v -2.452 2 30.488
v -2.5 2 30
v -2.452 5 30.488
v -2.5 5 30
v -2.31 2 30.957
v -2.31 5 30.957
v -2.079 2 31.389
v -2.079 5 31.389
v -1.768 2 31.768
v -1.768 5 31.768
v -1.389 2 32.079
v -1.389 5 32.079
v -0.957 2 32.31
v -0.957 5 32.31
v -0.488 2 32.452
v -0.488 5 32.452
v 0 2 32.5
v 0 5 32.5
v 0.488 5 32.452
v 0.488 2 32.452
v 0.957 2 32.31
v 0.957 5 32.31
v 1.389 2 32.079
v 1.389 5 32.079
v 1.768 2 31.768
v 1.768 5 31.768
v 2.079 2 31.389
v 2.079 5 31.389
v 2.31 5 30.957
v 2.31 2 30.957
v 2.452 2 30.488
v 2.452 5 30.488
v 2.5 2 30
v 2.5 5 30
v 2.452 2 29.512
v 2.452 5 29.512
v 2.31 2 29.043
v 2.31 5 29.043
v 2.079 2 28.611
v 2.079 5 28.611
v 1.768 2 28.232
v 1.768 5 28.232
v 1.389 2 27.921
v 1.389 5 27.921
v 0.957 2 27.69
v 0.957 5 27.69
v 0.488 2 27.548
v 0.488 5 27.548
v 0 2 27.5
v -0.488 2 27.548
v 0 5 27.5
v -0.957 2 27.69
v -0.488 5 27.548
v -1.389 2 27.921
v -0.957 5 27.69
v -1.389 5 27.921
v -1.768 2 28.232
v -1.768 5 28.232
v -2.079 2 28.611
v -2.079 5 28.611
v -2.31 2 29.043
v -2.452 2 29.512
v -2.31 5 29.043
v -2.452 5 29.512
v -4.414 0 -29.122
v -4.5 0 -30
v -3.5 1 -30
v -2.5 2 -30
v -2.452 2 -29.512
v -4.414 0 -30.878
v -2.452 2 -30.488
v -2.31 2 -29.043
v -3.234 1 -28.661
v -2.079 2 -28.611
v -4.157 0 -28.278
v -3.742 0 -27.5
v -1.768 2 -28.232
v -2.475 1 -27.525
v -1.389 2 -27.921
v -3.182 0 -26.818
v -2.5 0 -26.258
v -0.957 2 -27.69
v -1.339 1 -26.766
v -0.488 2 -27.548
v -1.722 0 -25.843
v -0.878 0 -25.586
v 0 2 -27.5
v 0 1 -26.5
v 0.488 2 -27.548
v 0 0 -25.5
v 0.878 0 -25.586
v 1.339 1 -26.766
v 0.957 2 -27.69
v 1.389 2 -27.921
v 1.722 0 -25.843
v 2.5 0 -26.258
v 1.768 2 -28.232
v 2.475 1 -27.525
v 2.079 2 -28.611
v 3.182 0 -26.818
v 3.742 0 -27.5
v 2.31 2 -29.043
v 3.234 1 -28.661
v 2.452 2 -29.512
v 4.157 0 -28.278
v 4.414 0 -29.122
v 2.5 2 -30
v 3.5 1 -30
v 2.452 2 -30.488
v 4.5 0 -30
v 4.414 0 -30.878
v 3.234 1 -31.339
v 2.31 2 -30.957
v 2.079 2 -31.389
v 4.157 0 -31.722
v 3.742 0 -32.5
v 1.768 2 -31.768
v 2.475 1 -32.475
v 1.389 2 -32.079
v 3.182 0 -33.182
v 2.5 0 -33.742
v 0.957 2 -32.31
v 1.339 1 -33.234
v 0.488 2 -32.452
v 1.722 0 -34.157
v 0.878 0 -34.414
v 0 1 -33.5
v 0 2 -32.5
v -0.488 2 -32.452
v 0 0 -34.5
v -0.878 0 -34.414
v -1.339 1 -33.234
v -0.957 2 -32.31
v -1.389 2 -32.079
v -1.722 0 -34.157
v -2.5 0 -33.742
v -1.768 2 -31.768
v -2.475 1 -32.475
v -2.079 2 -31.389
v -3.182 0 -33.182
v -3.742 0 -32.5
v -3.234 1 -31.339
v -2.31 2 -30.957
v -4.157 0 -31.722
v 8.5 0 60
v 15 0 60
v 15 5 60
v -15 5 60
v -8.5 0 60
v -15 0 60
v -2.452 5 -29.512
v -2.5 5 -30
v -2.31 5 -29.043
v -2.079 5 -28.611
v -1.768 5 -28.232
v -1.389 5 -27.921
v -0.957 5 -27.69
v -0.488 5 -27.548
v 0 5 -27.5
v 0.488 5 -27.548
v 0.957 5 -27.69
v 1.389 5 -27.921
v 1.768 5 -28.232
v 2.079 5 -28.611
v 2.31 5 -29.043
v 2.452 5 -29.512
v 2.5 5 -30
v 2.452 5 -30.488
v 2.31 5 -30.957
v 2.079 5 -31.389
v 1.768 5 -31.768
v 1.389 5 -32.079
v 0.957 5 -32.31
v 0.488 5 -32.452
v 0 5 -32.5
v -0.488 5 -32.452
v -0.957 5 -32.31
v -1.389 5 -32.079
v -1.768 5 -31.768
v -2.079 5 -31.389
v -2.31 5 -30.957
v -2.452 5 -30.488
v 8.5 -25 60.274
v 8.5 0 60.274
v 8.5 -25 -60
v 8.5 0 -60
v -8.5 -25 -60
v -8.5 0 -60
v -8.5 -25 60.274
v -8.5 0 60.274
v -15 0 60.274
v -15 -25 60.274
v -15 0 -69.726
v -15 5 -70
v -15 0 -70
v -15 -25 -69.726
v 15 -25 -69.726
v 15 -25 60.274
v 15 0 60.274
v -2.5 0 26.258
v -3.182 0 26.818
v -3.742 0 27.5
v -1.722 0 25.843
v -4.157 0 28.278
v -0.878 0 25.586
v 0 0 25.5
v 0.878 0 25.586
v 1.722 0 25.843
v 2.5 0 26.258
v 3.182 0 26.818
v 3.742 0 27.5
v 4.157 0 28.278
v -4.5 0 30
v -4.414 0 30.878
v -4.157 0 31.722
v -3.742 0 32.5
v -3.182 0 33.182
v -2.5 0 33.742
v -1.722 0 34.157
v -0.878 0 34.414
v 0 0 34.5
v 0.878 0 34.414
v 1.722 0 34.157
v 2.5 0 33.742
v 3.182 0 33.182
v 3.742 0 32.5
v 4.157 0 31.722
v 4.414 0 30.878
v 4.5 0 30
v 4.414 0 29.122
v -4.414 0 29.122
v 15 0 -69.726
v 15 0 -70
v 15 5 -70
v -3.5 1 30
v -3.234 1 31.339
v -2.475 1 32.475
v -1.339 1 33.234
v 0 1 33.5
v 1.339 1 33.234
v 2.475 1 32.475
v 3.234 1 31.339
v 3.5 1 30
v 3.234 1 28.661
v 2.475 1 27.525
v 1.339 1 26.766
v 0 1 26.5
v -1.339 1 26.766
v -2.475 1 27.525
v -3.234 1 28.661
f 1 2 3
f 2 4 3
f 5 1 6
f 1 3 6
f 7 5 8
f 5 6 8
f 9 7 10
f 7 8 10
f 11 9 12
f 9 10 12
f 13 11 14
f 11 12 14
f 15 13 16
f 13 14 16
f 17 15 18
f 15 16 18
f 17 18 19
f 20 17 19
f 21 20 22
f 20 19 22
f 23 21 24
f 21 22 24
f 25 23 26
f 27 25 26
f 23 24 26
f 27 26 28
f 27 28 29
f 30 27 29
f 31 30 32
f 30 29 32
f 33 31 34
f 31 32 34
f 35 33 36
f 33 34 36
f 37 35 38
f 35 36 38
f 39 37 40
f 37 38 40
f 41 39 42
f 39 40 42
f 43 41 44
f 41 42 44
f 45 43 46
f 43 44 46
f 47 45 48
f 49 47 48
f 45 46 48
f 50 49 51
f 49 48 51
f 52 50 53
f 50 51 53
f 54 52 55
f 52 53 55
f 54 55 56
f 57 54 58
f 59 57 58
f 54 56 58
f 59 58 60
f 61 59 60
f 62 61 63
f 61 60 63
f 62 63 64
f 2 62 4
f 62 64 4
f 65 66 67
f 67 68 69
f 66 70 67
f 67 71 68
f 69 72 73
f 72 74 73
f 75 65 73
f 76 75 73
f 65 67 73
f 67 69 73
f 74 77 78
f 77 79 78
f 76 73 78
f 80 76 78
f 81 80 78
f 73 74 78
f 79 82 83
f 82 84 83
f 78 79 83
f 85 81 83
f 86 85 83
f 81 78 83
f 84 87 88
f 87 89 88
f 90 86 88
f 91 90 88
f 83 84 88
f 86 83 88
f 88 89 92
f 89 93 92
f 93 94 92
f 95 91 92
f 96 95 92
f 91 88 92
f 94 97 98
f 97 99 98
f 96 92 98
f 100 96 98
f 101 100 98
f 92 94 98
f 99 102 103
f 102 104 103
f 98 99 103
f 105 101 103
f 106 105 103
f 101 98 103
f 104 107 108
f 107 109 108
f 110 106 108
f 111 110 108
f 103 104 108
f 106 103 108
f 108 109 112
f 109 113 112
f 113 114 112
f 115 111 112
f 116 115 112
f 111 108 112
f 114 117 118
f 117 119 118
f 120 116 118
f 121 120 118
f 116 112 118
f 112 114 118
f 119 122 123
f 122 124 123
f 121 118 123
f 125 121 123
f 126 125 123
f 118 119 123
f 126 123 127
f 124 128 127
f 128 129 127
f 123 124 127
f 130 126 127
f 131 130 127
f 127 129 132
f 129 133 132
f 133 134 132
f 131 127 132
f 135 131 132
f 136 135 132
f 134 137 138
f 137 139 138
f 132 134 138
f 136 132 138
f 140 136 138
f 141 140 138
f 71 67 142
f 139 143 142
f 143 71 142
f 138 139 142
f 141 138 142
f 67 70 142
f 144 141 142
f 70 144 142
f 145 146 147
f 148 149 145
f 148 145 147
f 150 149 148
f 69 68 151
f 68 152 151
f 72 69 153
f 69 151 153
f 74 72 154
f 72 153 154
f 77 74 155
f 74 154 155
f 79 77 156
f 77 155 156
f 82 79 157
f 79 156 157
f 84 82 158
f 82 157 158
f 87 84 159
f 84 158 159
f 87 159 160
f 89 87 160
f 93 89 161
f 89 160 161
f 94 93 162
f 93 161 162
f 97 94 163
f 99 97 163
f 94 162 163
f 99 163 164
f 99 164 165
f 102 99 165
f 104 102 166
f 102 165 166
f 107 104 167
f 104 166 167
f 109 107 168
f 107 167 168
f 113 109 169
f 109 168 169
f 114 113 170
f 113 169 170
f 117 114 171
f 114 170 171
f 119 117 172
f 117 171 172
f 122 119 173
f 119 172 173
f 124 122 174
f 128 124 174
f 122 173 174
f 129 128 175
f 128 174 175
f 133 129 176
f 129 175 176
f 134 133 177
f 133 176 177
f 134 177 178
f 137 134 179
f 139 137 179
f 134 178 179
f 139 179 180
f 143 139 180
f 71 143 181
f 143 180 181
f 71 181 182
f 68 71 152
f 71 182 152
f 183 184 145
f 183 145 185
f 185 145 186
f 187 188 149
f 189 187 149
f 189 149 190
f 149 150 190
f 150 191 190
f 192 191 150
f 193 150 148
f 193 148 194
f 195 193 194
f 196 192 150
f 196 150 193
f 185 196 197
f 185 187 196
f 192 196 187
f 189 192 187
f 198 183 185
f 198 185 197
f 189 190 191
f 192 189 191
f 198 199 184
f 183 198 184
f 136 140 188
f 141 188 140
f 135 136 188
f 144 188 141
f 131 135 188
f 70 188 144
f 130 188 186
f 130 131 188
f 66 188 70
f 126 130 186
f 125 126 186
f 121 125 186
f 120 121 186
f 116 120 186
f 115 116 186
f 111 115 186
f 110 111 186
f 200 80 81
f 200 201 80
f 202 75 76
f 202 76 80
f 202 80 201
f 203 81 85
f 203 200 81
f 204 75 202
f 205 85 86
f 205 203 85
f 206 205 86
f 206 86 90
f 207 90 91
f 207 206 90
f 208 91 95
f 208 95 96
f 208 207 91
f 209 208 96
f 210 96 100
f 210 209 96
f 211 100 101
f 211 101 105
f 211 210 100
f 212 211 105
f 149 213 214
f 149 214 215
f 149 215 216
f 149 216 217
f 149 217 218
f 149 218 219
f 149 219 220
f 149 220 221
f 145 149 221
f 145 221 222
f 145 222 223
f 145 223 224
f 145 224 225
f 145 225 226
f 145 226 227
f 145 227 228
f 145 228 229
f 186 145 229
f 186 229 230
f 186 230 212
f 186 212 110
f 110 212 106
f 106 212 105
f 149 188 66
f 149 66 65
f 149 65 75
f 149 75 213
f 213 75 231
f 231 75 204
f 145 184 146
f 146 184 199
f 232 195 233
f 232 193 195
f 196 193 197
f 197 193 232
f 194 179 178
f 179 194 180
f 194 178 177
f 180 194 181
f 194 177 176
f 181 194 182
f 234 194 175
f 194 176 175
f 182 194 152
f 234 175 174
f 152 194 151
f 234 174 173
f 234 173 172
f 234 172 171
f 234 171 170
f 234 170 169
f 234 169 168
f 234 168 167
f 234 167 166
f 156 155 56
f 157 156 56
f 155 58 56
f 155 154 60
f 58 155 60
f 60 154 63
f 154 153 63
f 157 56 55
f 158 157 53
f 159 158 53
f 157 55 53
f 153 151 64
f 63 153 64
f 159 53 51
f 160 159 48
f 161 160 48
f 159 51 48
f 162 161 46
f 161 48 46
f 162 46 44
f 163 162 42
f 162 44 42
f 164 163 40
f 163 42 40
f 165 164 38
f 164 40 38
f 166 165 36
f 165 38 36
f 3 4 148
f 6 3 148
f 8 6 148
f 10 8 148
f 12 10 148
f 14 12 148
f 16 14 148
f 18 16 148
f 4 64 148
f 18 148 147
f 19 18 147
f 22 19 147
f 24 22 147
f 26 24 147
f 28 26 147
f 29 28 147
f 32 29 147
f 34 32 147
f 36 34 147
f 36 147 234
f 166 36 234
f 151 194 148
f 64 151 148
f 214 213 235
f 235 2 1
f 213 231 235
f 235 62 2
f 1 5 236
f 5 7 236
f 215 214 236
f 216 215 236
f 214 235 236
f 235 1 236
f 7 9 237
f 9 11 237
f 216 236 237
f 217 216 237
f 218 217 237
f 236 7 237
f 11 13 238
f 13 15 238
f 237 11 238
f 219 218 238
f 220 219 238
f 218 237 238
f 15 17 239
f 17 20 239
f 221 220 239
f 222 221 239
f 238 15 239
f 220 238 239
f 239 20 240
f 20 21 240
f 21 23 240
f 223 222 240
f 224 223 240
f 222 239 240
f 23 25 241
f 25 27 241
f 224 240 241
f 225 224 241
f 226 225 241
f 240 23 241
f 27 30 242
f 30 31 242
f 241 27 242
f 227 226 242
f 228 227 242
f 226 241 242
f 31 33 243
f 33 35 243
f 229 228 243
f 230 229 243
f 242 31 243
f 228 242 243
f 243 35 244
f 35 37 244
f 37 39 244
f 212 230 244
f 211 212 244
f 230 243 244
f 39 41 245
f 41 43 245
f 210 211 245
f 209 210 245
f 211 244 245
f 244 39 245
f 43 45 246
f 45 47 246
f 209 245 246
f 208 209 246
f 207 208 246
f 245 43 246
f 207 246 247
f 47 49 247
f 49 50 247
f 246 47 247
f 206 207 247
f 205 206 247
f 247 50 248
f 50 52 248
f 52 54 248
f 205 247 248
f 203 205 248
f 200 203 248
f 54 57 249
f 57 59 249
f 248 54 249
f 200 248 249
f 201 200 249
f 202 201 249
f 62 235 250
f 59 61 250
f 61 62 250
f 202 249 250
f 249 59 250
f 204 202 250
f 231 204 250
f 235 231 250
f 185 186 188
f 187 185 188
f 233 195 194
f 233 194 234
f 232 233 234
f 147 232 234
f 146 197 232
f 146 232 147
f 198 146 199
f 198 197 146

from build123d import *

# Parameters (mm, degrees)
F1_DEPTH       = 25
F2_R           = 1.2421542977
F3_DEPTH       = 5
F4_D           = 5
F4_CSINK_D     = 9
F4_CSINK_ANGLE = 90


with BuildPart() as f1:
    # F0 (on Front) → F1 (new body)
    with BuildSketch(Plane.XZ):
        Polygon((-8.5, -60), (-8.5, 60.2744125164), (-15, 60.2744125164), (-15, -69.7255874836), (15, -69.7255874836), (15, 60.2744125164), (8.5, 60.2744125164), (8.5, -60), align=None)
    extrude(amount=F1_DEPTH)

    # F2 (on Front) → F3 (join)
    with BuildSketch(Plane.XZ):
        Polygon((15, -70), (15, 0), (15, 60), (-15, 60), (-15, 0), (-15, -70), align=None)
        with Locations((0, -30)):
            Circle(F2_R, mode=Mode.SUBTRACT)
    extrude(amount=-F3_DEPTH)

    # F4 (through all)
    with Locations(Plane.XZ):
        with Locations((0, 30), (0, -30)):
            CounterSinkHole(F4_D / 2, F4_CSINK_D / 2, counter_sink_angle=F4_CSINK_ANGLE)


solid = f1.part
